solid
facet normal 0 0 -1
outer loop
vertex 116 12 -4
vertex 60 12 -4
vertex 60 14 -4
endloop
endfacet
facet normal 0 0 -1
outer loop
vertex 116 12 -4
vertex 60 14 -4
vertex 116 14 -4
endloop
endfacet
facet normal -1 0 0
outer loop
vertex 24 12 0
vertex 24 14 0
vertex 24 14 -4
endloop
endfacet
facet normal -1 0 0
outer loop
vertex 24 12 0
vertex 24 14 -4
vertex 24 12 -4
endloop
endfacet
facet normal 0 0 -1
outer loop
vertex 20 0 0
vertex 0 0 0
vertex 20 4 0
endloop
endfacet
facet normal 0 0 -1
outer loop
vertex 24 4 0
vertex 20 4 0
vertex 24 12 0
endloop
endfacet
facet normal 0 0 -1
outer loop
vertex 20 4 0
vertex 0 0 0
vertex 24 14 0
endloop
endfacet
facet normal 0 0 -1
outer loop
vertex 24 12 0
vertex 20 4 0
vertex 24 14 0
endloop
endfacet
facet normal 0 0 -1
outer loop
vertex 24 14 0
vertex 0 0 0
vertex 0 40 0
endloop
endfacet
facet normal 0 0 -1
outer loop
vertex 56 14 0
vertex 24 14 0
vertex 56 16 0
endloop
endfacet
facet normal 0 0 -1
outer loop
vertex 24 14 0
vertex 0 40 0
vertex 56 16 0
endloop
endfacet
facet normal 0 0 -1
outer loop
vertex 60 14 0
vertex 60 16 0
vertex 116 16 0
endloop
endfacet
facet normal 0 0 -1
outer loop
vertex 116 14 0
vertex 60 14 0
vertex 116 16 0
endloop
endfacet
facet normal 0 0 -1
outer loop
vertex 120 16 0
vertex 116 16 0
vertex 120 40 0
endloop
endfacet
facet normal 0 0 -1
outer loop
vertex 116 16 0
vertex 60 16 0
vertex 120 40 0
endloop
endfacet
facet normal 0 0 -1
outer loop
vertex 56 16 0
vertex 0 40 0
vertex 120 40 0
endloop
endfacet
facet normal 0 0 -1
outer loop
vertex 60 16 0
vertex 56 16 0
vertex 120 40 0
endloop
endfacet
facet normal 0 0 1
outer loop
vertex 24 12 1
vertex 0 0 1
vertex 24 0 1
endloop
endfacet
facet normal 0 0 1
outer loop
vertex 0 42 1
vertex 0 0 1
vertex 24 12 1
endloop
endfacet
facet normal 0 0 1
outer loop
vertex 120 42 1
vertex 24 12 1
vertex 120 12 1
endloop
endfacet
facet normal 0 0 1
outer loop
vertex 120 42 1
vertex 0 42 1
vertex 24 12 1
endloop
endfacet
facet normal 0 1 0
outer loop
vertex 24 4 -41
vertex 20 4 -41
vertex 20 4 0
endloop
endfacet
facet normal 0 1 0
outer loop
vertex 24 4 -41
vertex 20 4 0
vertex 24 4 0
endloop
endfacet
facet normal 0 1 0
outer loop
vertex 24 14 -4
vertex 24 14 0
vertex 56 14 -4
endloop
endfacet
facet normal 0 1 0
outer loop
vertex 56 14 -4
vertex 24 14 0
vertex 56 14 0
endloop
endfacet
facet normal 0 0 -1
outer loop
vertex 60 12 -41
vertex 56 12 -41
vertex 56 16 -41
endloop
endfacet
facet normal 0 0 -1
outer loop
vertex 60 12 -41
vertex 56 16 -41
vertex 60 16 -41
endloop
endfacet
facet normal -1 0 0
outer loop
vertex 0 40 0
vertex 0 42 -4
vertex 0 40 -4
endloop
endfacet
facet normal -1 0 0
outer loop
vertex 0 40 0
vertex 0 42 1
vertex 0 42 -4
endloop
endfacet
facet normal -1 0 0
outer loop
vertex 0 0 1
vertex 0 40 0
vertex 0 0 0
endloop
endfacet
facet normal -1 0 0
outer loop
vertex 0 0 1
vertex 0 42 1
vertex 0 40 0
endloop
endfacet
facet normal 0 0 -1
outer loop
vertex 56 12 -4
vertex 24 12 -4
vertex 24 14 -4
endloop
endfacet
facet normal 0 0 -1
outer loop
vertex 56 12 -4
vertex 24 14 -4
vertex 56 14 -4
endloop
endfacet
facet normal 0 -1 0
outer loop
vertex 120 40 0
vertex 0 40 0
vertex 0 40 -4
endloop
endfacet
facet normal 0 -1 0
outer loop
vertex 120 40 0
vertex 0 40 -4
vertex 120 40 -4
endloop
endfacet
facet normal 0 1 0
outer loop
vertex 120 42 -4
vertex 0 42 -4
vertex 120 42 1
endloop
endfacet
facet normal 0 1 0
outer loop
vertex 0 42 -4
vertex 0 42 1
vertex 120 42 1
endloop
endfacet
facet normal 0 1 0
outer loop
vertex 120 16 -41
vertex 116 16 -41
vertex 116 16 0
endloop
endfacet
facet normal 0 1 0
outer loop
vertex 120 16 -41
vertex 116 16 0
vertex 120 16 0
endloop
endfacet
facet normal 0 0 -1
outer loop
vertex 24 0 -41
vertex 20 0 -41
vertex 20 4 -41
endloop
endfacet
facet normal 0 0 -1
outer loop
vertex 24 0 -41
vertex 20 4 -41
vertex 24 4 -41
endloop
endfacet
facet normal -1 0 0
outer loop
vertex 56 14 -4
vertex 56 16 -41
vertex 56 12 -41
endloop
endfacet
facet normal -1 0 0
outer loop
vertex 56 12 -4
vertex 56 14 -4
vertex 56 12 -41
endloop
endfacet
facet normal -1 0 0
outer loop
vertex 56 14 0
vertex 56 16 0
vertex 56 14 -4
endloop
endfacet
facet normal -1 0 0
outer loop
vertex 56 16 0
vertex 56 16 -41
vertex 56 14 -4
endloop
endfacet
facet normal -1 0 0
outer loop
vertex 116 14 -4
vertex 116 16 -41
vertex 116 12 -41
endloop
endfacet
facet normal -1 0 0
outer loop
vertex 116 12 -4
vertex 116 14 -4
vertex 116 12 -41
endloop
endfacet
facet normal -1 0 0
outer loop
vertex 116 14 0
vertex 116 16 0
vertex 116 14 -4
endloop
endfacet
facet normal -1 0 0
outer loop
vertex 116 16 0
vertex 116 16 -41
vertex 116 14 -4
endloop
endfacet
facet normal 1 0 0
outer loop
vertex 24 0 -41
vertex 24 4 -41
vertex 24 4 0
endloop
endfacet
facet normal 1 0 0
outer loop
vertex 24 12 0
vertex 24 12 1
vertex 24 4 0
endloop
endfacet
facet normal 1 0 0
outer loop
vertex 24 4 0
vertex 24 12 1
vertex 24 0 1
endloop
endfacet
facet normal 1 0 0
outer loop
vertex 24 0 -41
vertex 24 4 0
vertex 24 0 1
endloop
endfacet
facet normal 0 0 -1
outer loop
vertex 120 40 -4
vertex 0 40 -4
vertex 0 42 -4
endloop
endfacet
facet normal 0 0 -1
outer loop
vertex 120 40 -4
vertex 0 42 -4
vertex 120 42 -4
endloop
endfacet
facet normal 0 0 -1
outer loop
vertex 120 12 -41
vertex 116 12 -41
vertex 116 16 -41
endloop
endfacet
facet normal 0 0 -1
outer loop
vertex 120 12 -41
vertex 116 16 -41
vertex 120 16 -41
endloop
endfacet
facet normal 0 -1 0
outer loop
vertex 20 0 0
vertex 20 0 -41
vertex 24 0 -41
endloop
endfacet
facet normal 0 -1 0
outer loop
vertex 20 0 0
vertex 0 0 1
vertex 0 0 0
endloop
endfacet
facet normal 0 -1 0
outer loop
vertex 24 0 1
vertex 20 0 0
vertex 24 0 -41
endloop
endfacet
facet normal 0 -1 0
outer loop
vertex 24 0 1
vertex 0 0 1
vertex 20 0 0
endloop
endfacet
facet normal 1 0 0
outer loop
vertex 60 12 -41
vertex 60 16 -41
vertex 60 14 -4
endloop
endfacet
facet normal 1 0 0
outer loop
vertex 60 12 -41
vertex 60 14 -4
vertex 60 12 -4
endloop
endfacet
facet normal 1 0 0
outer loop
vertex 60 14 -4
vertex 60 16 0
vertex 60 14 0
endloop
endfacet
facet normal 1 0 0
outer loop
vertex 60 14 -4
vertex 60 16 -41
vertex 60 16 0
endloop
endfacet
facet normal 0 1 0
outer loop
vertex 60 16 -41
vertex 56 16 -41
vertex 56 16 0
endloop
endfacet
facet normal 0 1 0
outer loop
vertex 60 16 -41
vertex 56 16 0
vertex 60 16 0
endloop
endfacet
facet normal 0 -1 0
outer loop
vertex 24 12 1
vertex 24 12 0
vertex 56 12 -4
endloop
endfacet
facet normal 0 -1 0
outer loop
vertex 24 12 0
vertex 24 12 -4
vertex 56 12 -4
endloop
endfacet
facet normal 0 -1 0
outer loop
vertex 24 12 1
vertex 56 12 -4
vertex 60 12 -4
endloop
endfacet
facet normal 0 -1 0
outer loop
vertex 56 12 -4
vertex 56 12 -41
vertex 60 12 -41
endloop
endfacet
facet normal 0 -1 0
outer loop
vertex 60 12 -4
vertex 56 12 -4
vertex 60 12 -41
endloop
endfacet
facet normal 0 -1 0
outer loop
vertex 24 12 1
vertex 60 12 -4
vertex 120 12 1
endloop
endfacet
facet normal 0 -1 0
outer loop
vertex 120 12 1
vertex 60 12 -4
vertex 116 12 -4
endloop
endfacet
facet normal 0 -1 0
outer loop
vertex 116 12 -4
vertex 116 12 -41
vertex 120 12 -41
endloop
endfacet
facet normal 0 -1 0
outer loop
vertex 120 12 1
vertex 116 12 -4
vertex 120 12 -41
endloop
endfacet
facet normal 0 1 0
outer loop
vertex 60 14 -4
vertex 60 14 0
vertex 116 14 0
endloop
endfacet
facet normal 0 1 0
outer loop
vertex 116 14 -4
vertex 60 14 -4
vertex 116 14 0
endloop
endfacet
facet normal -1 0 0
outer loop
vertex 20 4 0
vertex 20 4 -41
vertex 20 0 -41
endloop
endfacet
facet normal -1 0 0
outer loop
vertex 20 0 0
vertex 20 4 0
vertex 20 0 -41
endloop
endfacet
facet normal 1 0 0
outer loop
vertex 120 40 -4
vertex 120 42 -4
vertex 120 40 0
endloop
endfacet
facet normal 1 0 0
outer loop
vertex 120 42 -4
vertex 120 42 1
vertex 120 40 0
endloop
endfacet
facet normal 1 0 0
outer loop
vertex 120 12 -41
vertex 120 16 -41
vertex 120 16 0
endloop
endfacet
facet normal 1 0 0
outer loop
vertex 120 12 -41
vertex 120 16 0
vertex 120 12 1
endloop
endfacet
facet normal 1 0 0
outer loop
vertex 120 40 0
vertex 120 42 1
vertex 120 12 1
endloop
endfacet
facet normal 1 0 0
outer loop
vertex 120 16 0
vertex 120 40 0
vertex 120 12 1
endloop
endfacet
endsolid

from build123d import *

# Parameters (mm, degrees)
F1_DEPTH = 1
F2_W     = 4
F2_H     = 4
F3_DEPTH = 41
F4_W     = 120
F4_H     = 2
F4_W_2   = 32
F4_W_3   = 56
F5_DEPTH = 4


with BuildPart() as f1:
    # F0 (on Top) → F1 (new body)
    with BuildSketch(Plane.XY):
        Polygon((0, 42), (0, 0), (24, 0), (24, 12), (120, 12), (120, 42), align=None)
    extrude(amount=F1_DEPTH)

    # F2 (on face) → F3 (join)
    with BuildSketch(Plane(origin=(0, 0, 0), x_dir=(1, 0, 0), z_dir=(0, 0, -1))):
        with Locations((22, -2)):
            Rectangle(F2_W, F2_H)
        with Locations((58, -14)):
            Rectangle(F2_W, F2_H)
        with Locations((118, -14)):
            Rectangle(F2_W, F2_H)
    extrude(amount=F3_DEPTH)

    # F4 (on face) → F5 (join)
    with BuildSketch(Plane(origin=(0, 0, 0), x_dir=(1, 0, 0), z_dir=(0, 0, -1))):
        with Locations((60, -41)):
            Rectangle(F4_W, F4_H)
        with Locations((40, -13)):
            Rectangle(F4_W_2, F4_H)
        with Locations((88, -13)):
            Rectangle(F4_W_3, F4_H)
    extrude(amount=F5_DEPTH)


solid = f1.part
